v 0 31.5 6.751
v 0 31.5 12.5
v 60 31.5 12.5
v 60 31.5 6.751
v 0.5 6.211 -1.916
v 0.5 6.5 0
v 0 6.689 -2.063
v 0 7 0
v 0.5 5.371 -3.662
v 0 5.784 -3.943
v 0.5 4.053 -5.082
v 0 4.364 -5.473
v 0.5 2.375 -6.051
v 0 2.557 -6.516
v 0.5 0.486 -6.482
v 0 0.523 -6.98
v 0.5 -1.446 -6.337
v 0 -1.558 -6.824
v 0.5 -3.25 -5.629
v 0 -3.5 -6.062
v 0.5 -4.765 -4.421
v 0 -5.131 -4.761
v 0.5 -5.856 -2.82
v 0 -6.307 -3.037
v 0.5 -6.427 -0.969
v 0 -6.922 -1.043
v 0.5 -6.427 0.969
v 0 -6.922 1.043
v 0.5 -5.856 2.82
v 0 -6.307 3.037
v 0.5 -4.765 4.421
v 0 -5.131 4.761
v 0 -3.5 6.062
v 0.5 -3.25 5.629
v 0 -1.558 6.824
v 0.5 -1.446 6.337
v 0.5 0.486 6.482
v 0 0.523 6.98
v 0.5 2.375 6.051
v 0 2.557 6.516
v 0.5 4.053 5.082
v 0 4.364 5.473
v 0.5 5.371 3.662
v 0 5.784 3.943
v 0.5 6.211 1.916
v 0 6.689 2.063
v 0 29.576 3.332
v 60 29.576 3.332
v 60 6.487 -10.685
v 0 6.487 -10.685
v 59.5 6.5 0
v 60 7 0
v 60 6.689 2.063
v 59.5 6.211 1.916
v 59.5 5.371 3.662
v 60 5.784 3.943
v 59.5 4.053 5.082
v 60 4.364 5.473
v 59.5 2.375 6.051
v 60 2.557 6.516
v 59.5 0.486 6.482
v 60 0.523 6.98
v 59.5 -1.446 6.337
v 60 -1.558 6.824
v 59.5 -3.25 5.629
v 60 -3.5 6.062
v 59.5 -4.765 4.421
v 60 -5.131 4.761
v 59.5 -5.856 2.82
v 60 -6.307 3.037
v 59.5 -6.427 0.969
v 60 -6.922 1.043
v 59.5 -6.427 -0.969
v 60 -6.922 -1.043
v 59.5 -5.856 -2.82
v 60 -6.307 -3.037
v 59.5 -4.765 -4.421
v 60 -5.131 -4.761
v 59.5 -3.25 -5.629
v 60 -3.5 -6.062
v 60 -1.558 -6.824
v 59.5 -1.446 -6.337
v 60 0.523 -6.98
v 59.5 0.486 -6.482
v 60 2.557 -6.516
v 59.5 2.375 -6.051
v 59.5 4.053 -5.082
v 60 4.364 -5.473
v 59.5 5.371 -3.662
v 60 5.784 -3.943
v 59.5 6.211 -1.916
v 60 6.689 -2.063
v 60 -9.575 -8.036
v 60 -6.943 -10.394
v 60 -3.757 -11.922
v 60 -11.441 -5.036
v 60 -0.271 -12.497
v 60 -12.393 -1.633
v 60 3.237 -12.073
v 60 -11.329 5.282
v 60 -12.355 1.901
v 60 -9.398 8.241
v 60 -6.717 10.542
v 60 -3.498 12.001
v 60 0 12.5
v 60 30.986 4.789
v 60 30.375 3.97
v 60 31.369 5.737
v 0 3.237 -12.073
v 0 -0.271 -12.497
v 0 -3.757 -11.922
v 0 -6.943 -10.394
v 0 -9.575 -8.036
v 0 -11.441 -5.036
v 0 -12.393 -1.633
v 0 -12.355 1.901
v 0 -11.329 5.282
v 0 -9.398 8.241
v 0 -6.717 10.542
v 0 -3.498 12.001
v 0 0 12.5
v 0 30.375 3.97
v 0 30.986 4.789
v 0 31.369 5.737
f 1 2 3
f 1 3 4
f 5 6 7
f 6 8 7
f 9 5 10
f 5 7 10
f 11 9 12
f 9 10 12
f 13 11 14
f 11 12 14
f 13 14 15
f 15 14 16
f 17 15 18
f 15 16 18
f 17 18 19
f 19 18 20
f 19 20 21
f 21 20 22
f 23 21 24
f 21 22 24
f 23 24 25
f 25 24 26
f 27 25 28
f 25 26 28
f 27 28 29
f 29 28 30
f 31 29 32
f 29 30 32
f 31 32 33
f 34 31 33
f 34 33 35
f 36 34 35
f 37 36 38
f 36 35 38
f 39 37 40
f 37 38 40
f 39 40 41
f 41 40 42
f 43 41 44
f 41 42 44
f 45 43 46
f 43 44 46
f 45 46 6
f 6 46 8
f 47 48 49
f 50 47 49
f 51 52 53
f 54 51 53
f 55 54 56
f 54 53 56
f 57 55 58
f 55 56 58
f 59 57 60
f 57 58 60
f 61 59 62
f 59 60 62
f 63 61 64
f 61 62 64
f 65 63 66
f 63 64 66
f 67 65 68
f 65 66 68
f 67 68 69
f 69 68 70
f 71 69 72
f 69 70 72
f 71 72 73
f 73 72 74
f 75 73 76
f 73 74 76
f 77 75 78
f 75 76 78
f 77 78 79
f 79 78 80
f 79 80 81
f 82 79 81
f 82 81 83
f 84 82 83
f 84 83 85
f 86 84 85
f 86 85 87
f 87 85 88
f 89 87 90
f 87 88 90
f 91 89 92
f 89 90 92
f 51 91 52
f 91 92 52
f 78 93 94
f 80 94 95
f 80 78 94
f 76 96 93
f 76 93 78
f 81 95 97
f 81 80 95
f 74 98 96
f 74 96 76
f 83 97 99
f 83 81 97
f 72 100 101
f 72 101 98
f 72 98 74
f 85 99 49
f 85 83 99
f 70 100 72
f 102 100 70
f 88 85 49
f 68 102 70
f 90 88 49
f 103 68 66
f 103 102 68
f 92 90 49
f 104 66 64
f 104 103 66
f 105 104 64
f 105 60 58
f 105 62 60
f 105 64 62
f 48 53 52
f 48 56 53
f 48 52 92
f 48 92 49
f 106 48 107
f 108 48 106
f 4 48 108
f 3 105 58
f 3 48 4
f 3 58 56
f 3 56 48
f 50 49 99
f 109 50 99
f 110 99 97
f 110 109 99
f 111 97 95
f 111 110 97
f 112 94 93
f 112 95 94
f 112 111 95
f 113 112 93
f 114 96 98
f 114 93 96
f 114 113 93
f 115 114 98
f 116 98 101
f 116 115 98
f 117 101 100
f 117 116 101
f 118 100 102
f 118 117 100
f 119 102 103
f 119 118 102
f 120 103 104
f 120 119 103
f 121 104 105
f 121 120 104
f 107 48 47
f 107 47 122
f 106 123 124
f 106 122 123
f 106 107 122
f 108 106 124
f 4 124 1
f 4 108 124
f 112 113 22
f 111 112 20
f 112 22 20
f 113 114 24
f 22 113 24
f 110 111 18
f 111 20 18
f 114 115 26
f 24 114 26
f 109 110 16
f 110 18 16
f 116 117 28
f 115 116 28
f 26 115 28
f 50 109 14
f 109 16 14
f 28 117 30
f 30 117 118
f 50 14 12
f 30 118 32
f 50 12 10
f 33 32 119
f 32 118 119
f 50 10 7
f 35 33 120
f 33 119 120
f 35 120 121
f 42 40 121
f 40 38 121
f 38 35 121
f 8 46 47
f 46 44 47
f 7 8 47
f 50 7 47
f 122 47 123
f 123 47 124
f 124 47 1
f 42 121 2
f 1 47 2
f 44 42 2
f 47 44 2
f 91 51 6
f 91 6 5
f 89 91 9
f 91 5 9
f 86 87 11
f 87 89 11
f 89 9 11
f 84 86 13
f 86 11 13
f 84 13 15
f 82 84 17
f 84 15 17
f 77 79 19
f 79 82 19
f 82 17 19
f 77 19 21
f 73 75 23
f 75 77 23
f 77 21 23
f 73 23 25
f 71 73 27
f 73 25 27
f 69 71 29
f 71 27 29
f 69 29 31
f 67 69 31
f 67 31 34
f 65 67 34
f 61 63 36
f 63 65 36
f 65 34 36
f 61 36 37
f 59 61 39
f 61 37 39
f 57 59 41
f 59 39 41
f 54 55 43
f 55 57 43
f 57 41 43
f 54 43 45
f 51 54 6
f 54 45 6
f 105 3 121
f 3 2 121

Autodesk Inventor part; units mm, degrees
ref_plane "YZ Plane" through (0, 0, 0) normal (1, 0, 0) x (0, 1, 0)
ref_plane "XZ Plane" through (0, 0, 0) normal (0, 1, 0) x (-1, 0, 0)
ref_plane "XY Plane" through (0, 0, 0) normal (0, 0, 1) x (1, 0, 0)
sketch "Náčrt2" plane through (0, 0, 0) normal (1, 0, 0) x (0, 1, 0)
  circle A0 centre (0, 0) radius 6.5
  line L0 (31.5, 12.5) -> (0, 12.5)
  line L1 (31.5, 12.5) -> (31.5, 4.5)
  line L2 (31.5, 4.5) -> (6.4868, -10.6851)
  arc A1 (0, 12.5) -> (6.4868, -10.6851) centre (0, 0) ccw
  dimension "d0" = 13
  dimension "d1" = 6
  dimension "d2" = 31.5
  dimension "d3" = 8
extrude "Vysunutí1" add sketch "Náčrt2" along normal blind 60
fillet "Zaoblení1" radius 4 1 edges at (30, 31.5, 4.5)
chamfer "Zkosení1" distance 0.5 angle 45 2 edges at (0, -6.5, 0) (60, -6.5, 0)
properties part number "DD_KVD_003_10_E" material "Nerezová ocel"
